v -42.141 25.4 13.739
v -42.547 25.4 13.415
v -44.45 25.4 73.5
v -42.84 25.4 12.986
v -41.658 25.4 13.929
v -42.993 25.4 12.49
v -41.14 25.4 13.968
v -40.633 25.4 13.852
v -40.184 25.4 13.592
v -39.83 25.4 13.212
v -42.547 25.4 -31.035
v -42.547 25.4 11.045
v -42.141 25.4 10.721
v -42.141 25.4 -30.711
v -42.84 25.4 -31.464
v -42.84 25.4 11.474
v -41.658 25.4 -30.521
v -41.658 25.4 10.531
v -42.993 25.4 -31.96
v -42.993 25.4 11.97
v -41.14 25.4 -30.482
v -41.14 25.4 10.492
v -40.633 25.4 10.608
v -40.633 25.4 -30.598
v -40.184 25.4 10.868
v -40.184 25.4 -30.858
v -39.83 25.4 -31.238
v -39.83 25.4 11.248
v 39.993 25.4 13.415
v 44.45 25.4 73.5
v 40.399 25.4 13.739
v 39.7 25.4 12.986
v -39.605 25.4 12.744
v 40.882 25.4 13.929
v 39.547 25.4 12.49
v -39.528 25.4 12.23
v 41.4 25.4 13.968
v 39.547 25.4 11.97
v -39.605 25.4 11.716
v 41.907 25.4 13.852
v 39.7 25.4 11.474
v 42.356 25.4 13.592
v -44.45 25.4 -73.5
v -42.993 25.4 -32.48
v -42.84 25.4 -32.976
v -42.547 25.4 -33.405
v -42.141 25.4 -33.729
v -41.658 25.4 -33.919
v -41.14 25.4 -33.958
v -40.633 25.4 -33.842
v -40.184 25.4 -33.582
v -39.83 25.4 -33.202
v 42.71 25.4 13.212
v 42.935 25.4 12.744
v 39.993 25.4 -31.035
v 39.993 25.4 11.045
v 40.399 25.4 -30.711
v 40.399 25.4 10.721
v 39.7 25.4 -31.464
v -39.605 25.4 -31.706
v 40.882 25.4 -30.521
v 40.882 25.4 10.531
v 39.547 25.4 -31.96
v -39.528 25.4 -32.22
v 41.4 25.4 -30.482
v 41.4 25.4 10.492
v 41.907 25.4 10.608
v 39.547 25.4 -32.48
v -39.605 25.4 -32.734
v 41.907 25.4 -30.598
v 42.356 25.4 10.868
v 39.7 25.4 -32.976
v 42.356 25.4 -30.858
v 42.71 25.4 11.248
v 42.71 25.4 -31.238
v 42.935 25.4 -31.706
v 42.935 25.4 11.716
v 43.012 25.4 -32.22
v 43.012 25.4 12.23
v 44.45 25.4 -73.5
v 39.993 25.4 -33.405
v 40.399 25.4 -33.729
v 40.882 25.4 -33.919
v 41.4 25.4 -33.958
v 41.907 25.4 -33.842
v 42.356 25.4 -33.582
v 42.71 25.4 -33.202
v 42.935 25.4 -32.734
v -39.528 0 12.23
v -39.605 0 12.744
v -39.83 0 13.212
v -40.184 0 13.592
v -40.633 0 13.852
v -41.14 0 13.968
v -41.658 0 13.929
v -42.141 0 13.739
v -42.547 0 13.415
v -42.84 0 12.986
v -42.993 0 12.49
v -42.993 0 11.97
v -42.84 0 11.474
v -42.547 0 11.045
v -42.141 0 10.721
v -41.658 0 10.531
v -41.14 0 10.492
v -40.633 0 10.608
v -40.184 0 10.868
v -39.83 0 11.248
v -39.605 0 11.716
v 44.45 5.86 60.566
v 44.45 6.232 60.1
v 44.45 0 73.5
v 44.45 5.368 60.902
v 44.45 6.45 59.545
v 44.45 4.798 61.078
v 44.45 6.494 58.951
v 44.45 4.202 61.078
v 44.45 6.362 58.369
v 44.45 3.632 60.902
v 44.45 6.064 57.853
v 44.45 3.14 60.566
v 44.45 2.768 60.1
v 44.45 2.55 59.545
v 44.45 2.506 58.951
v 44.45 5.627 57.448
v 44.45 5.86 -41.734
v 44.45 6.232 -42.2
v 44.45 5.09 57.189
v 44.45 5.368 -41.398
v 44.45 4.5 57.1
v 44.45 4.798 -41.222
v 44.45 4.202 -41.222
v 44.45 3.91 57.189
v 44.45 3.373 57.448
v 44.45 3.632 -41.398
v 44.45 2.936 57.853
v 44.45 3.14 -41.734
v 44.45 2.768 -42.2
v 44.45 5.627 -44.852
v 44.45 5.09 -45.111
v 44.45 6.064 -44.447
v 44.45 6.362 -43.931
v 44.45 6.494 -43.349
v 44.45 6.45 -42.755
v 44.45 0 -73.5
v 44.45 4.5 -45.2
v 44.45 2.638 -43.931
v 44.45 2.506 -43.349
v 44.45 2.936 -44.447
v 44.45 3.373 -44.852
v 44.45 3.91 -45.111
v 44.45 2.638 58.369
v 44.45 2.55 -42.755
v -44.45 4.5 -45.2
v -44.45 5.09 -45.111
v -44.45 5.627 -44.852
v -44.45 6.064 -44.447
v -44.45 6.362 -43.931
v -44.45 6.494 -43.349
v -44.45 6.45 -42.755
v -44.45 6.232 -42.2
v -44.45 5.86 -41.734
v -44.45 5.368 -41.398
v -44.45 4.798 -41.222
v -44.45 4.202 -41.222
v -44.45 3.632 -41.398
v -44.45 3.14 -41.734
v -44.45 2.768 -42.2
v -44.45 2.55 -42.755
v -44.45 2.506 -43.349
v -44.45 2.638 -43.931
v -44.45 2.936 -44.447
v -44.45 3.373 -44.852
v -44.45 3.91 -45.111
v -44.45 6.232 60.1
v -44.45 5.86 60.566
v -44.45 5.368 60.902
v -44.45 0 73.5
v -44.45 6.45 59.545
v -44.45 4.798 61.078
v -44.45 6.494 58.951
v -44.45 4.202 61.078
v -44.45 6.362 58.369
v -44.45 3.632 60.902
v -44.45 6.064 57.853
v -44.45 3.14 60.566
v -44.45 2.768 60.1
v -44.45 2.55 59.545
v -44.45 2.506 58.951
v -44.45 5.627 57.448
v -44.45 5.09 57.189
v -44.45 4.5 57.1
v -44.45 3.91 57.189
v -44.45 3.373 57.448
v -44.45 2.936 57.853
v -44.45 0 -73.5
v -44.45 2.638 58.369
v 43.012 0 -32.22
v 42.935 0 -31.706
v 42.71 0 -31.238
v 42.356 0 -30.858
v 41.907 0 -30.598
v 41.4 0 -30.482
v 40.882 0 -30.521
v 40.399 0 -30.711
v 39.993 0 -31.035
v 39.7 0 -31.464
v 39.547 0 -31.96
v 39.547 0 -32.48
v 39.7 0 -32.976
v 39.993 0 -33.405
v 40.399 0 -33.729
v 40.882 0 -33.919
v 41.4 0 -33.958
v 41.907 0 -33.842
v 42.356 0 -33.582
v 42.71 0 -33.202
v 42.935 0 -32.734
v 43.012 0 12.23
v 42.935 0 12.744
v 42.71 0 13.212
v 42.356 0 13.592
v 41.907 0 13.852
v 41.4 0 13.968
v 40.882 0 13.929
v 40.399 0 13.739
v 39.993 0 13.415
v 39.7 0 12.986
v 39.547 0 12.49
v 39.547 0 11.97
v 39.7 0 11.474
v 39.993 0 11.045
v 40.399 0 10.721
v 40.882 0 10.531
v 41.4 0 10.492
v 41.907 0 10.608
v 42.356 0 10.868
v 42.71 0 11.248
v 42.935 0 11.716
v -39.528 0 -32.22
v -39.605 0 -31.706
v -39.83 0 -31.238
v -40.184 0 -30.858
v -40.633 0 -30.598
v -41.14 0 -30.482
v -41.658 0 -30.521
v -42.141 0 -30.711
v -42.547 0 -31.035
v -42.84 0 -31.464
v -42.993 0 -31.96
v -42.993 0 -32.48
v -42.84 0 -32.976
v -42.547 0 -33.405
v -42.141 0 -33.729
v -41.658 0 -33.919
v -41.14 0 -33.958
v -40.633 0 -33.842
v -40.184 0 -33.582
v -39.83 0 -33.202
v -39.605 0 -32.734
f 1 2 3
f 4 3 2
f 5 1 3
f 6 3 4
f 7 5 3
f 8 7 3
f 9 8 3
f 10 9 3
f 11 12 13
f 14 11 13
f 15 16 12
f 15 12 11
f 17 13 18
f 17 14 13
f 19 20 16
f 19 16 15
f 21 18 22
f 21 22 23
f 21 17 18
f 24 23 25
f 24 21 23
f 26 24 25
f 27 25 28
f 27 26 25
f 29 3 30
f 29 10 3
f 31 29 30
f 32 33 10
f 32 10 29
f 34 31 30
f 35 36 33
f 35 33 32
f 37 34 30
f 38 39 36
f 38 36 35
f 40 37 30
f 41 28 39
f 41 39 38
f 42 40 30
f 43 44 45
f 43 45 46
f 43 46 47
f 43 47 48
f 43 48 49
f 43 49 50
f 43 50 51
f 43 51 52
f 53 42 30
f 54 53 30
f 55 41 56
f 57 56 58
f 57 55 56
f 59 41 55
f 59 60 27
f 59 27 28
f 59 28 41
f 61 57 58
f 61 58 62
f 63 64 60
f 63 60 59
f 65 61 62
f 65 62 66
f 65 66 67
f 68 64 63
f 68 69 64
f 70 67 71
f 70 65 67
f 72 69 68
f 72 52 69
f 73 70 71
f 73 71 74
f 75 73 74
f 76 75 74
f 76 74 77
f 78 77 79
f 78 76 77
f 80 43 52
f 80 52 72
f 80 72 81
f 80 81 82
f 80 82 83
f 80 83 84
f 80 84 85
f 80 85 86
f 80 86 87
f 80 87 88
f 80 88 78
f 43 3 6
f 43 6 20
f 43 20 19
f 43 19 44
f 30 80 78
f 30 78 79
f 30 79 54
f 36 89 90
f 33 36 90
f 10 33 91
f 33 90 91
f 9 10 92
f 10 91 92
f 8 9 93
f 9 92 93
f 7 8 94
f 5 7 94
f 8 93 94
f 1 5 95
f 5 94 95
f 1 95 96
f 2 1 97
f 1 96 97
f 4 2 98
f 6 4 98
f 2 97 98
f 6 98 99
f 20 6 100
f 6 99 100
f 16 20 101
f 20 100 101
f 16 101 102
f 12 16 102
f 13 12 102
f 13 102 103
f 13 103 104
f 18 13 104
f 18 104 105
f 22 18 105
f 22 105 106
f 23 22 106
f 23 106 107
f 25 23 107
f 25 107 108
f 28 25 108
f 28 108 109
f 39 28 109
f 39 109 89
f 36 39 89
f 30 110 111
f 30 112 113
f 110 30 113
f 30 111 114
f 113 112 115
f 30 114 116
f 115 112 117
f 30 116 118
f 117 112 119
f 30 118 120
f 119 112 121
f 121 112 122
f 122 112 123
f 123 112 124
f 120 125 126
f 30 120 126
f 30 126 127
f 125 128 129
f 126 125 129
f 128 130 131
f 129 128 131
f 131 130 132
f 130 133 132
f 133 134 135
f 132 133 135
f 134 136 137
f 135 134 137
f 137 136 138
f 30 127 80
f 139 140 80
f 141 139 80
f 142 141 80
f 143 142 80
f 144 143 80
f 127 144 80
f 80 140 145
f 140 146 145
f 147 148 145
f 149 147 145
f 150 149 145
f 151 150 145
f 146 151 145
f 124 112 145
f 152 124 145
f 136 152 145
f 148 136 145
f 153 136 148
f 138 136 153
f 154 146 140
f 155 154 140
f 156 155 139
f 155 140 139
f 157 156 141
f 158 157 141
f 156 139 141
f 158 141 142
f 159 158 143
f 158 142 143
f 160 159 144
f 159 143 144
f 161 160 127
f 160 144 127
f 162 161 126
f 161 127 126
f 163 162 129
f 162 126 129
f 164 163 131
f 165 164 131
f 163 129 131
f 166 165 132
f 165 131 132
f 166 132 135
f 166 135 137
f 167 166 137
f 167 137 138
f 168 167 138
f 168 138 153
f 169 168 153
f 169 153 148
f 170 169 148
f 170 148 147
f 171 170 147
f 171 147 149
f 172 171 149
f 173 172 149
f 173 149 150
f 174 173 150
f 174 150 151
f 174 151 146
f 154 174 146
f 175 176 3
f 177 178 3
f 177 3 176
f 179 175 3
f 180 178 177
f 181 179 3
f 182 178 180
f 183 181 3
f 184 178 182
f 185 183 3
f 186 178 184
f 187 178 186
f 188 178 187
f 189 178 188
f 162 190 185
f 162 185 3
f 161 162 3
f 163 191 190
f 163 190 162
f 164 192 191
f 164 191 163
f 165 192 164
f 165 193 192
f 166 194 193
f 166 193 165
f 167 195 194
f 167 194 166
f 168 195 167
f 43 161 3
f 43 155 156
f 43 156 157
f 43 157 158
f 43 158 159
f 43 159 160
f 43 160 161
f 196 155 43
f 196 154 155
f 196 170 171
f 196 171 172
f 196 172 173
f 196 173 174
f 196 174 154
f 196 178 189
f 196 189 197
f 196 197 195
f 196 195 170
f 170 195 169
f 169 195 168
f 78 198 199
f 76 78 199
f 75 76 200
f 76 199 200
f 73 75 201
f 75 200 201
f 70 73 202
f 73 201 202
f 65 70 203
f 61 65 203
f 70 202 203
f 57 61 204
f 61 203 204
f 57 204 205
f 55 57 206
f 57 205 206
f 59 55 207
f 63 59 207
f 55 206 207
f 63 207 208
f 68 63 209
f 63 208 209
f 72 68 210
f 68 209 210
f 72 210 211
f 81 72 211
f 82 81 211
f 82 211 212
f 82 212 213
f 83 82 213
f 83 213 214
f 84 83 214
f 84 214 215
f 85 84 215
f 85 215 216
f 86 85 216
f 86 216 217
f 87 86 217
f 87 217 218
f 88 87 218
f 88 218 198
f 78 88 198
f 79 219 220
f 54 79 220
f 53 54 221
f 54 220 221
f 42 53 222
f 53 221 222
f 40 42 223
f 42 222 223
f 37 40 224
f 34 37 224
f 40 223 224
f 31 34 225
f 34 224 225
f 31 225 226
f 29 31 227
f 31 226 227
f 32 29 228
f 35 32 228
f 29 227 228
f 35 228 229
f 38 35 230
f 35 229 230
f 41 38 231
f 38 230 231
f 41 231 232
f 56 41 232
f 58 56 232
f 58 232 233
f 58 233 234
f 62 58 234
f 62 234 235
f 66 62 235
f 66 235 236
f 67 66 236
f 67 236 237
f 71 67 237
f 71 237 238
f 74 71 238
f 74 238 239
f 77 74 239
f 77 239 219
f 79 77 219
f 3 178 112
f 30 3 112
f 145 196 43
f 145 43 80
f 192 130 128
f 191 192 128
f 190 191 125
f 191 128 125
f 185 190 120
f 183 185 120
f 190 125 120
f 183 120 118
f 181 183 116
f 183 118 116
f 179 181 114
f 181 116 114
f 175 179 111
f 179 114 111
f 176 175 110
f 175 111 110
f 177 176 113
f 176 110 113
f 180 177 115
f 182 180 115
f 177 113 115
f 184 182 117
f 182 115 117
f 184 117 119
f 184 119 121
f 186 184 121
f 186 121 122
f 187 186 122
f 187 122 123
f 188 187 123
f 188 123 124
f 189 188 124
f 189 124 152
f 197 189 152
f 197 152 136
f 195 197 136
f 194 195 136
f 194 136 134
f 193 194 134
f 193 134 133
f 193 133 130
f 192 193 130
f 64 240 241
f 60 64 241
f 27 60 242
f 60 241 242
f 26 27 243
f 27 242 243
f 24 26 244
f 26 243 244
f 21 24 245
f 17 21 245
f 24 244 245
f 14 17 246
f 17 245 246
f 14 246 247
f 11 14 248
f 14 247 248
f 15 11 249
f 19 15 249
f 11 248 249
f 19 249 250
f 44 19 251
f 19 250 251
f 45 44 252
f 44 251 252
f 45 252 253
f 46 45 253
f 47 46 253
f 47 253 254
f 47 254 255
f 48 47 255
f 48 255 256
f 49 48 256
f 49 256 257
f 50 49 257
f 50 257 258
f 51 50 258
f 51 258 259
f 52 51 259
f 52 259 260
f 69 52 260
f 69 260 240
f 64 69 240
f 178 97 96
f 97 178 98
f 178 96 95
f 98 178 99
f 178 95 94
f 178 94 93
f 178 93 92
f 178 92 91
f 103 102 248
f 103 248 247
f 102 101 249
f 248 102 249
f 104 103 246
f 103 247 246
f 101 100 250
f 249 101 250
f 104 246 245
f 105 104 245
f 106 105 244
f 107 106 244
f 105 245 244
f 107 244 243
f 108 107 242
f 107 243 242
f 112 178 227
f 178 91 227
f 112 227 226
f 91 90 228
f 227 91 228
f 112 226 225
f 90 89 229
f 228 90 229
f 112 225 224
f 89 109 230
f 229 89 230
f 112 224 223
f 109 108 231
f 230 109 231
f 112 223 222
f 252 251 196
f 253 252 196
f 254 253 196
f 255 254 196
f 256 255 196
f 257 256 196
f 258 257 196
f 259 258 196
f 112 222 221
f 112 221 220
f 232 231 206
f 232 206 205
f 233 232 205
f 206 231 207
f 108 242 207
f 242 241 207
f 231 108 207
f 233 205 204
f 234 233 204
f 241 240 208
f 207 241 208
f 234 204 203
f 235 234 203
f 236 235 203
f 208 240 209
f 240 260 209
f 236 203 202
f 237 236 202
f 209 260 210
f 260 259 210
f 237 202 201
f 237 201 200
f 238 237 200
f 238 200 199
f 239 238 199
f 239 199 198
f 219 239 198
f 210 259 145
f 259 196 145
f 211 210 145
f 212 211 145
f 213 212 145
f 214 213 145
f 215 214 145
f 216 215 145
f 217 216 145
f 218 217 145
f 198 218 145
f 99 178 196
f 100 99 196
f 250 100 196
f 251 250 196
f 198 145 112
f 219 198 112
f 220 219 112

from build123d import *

# Parameters (mm, degrees)
SKETCH1_W           = 88.9
SKETCH1_H           = 147
BOSS_EXTRUDE1_DEPTH = 25.4
SKETCH2_R           = 1.74244
CUT_EXTRUDE1_DEPTH  = 30
CUT_EXTRUDE2_REACH  = 90.9
SKETCH3_R           = 2


with BuildPart() as part:
    # Sketch1 → Boss-Extrude1 (new body)
    with BuildSketch(Plane(origin=(0, 0, 0), x_dir=(1, 0, 0), z_dir=(0, 1, 0))):
        Rectangle(SKETCH1_W, SKETCH1_H)
    extrude(amount=BOSS_EXTRUDE1_DEPTH)

    # Sketch2 → Cut-Extrude1 (cut)
    with BuildSketch(Plane.XZ):
        with Locations((41.27, -32.22)):
            Circle(SKETCH2_R)
        with Locations((41.27, 12.23)):
            Circle(SKETCH2_R)
        with Locations((-41.27, -32.22)):
            Circle(SKETCH2_R)
        with Locations((-41.27, 12.23)):
            Circle(SKETCH2_R)
    extrude(amount=-CUT_EXTRUDE1_DEPTH, mode=Mode.SUBTRACT)

    # Sketch3 → Cut-Extrude2 (cut, up to next)
    with BuildSketch(Plane(origin=(44.45, 0, 0), x_dir=(0, 0, -1), z_dir=(1, 0, 0)), mode=Mode.PRIVATE) as cut_extrude2_sk1:
        with Locations((-59.1, 4.5)):
            Circle(SKETCH3_R)
    cut_extrude2_tool1 = extrude(cut_extrude2_sk1.sketch, amount=-CUT_EXTRUDE2_REACH, mode=Mode.PRIVATE) & part.part
    add(cut_extrude2_tool1.solids().sort_by_distance((44.45, 4.5, 59.1))[0], mode=Mode.SUBTRACT)
    # Sketch3 → Cut-Extrude2 (cut, up to next)
    with BuildSketch(Plane(origin=(44.45, 0, 0), x_dir=(0, 0, -1), z_dir=(1, 0, 0)), mode=Mode.PRIVATE) as cut_extrude2_sk2:
        with Locations((43.2, 4.5)):
            Circle(SKETCH3_R)
    cut_extrude2_tool2 = extrude(cut_extrude2_sk2.sketch, amount=-CUT_EXTRUDE2_REACH, mode=Mode.PRIVATE) & part.part
    add(cut_extrude2_tool2.solids().sort_by_distance((44.45, 4.5, -43.2))[0], mode=Mode.SUBTRACT)


solid = part.part
